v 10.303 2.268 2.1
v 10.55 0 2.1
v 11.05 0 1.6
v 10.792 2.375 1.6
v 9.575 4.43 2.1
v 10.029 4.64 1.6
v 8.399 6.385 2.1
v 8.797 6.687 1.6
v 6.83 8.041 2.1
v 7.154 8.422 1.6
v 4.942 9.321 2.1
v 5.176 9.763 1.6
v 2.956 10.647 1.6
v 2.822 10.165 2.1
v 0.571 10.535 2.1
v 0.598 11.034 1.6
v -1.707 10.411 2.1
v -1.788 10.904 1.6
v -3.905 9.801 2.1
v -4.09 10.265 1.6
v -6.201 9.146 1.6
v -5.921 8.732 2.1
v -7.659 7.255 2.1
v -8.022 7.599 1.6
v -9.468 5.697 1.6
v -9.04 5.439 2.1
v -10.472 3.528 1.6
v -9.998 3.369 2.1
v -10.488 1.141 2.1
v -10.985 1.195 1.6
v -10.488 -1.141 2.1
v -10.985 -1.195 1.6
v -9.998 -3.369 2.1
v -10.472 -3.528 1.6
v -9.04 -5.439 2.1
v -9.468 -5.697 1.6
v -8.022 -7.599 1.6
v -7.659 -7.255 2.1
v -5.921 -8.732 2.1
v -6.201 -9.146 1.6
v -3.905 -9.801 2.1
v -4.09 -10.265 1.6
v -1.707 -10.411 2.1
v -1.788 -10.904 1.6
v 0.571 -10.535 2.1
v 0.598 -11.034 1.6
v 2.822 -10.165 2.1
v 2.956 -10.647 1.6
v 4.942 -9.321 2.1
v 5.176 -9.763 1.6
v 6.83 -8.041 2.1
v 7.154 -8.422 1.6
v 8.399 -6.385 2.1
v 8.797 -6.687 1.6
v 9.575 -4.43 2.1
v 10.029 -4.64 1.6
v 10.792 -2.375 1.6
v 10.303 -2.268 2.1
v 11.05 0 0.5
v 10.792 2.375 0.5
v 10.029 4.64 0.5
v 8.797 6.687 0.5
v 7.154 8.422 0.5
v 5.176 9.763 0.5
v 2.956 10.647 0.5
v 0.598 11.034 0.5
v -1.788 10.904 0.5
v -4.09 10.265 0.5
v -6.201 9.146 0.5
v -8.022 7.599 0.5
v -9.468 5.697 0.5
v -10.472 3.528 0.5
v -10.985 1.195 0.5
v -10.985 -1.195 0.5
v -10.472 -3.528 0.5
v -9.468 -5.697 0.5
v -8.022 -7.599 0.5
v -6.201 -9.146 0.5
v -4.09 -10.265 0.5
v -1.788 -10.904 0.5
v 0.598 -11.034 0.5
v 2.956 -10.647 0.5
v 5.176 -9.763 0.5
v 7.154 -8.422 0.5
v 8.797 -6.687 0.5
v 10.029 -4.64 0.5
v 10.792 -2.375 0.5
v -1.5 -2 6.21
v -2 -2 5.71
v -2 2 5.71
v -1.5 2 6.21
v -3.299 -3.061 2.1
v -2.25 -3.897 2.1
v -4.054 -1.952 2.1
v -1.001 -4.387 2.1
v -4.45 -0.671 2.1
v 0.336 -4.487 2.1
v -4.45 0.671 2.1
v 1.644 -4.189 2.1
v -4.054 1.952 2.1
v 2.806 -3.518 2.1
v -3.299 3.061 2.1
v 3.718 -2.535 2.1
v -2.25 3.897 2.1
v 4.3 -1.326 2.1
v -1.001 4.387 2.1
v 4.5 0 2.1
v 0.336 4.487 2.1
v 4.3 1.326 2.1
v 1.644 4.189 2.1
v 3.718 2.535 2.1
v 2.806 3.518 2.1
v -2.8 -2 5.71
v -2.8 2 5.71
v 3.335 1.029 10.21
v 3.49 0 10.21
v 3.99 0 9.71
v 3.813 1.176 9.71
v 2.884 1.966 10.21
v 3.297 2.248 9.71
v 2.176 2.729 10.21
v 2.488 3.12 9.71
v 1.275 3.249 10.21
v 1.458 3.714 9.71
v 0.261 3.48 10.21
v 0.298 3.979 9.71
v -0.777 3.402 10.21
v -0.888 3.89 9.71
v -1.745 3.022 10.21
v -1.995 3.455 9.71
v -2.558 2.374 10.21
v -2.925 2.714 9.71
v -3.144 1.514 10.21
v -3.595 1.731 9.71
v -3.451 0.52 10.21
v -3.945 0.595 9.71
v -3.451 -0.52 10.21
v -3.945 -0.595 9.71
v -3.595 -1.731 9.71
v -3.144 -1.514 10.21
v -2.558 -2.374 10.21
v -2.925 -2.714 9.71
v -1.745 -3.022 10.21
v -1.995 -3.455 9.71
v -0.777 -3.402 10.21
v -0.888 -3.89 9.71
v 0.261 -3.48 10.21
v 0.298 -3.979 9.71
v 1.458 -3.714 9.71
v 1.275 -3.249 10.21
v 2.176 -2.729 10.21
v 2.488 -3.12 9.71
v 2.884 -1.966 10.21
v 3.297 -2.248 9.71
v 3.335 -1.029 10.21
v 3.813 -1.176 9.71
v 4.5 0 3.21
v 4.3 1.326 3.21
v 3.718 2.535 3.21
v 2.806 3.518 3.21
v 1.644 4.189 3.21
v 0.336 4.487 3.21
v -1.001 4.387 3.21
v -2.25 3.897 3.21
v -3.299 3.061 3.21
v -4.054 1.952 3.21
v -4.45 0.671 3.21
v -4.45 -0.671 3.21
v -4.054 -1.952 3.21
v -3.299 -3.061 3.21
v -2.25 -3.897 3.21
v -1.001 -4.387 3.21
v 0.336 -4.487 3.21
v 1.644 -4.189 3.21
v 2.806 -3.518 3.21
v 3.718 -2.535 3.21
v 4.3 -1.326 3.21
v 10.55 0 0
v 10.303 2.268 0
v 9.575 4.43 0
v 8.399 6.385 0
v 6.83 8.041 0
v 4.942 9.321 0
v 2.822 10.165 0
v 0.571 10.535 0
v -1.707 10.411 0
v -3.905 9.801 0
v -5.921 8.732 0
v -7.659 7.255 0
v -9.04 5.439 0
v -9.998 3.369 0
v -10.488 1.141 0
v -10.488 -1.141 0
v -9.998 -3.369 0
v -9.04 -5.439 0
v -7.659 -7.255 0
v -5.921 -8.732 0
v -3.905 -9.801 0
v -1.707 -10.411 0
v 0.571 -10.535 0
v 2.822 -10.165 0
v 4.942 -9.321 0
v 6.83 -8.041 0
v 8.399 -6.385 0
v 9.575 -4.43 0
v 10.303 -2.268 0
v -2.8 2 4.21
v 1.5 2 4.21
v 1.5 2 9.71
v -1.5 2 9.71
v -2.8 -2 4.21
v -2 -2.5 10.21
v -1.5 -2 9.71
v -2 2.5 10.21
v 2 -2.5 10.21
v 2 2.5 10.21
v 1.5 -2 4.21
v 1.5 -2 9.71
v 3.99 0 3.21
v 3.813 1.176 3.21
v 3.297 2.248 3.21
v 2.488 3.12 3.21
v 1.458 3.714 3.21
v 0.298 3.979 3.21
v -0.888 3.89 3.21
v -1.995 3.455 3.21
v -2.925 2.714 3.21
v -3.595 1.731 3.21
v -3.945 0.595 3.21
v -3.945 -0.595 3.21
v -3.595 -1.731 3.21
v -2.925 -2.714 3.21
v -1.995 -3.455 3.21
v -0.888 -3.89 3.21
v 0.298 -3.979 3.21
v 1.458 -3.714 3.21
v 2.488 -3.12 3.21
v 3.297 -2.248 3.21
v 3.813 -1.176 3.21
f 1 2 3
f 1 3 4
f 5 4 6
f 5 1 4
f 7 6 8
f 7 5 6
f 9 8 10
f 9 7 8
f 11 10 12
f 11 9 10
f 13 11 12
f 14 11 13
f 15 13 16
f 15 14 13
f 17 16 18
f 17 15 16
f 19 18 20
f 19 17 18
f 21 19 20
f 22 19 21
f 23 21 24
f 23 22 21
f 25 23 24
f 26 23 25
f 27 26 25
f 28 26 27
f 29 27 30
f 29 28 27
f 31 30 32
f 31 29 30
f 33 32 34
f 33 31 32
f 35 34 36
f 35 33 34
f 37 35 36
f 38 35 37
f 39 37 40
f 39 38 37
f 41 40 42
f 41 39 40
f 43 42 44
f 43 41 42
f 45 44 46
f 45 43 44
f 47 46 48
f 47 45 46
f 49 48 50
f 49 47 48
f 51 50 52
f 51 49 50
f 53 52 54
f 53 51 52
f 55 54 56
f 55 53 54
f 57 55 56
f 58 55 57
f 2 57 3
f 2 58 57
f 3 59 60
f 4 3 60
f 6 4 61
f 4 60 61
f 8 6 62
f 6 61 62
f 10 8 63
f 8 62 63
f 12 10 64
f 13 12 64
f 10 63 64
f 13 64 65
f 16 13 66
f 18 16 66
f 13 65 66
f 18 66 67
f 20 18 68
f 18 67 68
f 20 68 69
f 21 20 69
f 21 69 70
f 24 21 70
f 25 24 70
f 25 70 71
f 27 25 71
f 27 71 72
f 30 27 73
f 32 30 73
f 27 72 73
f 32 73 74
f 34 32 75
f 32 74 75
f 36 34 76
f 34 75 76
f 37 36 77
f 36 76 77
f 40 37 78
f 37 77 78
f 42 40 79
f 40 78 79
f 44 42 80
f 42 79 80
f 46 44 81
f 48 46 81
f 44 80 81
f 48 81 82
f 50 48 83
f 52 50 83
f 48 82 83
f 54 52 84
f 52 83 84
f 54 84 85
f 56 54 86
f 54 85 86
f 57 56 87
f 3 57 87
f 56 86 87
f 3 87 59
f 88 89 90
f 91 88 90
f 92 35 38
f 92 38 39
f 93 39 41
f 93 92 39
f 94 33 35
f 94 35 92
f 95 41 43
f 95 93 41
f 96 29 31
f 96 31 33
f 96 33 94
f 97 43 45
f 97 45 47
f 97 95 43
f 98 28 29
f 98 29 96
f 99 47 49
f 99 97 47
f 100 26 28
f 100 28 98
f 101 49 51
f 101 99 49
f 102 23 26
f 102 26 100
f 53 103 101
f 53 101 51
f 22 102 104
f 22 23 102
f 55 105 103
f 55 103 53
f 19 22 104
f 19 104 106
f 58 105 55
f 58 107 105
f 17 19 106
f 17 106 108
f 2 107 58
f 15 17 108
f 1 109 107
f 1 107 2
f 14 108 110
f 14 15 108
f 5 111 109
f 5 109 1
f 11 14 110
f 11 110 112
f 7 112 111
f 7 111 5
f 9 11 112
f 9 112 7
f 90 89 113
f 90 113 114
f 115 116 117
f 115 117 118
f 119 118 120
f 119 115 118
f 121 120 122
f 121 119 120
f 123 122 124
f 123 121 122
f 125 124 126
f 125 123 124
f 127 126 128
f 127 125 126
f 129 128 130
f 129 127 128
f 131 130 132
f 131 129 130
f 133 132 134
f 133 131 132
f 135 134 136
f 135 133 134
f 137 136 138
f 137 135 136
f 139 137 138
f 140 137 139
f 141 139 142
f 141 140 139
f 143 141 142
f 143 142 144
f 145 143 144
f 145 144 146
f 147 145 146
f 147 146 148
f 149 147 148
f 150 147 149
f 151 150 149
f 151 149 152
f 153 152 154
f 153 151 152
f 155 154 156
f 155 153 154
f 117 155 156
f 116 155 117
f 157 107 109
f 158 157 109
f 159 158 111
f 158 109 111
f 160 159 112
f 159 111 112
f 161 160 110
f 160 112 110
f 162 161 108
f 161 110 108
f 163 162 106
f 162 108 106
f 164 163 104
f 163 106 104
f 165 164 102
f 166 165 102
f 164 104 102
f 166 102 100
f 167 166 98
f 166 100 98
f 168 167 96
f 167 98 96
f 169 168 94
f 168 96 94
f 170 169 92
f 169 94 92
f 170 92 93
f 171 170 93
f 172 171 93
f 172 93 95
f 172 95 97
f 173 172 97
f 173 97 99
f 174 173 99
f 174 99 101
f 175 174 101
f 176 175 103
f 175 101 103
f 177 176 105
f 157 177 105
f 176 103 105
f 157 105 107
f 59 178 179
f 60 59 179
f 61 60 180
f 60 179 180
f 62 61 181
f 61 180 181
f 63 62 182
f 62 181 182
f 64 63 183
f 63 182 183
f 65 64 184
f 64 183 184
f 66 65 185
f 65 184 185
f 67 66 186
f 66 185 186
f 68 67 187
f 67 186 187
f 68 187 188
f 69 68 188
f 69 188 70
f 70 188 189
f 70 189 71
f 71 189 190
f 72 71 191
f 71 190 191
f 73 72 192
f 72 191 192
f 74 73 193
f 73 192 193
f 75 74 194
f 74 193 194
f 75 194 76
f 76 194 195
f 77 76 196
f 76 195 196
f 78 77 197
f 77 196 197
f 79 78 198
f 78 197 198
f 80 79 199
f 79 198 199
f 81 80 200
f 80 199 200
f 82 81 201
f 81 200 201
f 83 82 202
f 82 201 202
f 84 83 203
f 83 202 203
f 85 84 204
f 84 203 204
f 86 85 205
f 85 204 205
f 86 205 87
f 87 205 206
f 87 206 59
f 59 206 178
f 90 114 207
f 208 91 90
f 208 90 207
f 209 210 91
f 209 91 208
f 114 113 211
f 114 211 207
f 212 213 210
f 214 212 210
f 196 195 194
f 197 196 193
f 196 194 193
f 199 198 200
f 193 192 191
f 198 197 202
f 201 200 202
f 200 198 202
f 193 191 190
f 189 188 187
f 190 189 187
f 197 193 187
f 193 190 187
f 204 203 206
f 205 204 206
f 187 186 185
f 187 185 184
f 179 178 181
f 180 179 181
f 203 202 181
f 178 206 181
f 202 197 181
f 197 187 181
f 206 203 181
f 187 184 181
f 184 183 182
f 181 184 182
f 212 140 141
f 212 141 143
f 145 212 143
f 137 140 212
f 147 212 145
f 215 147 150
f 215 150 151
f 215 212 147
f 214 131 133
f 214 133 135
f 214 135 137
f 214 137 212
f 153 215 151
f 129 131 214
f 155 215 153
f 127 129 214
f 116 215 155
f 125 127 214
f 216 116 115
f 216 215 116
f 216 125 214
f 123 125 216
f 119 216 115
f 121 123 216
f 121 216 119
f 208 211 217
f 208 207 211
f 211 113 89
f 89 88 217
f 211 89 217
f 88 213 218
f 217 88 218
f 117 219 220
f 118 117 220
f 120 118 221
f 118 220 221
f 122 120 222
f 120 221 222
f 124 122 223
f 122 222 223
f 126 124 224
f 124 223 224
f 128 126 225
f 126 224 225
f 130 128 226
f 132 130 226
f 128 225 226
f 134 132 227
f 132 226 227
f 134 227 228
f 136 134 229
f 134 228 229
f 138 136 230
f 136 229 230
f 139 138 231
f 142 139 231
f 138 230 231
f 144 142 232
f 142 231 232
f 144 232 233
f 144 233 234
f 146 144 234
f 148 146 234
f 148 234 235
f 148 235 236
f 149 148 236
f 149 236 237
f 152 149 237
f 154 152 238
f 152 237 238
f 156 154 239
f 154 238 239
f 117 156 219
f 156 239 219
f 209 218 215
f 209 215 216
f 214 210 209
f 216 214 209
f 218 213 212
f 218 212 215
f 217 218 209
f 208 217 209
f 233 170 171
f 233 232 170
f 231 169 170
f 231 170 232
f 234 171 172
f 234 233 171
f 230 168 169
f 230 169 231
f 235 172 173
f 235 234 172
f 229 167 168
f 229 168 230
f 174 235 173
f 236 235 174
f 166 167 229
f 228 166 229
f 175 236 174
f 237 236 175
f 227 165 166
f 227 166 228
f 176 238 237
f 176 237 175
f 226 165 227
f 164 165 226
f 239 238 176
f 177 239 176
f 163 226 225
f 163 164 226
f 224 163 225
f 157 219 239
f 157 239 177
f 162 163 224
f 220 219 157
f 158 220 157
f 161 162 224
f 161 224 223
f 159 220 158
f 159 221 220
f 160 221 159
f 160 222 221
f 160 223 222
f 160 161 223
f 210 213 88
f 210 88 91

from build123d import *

# Parameters (mm, degrees)
F0_R     = 11.05
F1_DEPTH = 2.1
F2_R     = 4.5
F3_DEPTH = 1.11
F4_R     = 3.99
F5_DEPTH = 7
F6_W     = 3
F6_H     = 4
F7_DEPTH = 6
F8_W     = 4
F8_H     = 1.5
F9_DEPTH = 1.3
F10_SIZE = 0.5


with BuildPart() as f1:
    # F0 (on Top) → F1 (new body)
    with BuildSketch(Plane.XY):
        Circle(F0_R)
    extrude(amount=F1_DEPTH)

    # F2 (on face) → F3 (join)
    with BuildSketch(Plane.XY.offset(2.1)):
        Circle(F2_R)
    extrude(amount=F3_DEPTH)

    # F4 (on face) → F5 (join)
    with BuildSketch(Plane.XY.offset(3.21)):
        Circle(F4_R)
    extrude(amount=F5_DEPTH)

    # F6 (on face) → F7 (cut)
    with BuildSketch(Plane.XY.offset(10.21)):
        Rectangle(F6_W, F6_H)
    extrude(amount=-F7_DEPTH, mode=Mode.SUBTRACT)

    # F8 (on face) → F9 (cut)
    with BuildSketch(Plane.YZ.offset(-1.5)):
        with Locations((0, 4.96)):
            Rectangle(F8_W, F8_H)
    extrude(amount=-F9_DEPTH, mode=Mode.SUBTRACT)

    # F10
    f10_edges = [f1.edges().sort_by_distance(p)[0] for p in [
        (-1.5, 0, 5.71),
        (0, 2, 10.21),
        (-1.5, 0, 10.21),
        (1.5, 0, 10.21),
        (0, -2, 10.21),
        (-3.99, 0, 10.21),
        (-11.05, 0, 0),
        (-11.05, 0, 2.1),
    ]]
    chamfer(f10_edges, length=F10_SIZE)


solid = f1.part
